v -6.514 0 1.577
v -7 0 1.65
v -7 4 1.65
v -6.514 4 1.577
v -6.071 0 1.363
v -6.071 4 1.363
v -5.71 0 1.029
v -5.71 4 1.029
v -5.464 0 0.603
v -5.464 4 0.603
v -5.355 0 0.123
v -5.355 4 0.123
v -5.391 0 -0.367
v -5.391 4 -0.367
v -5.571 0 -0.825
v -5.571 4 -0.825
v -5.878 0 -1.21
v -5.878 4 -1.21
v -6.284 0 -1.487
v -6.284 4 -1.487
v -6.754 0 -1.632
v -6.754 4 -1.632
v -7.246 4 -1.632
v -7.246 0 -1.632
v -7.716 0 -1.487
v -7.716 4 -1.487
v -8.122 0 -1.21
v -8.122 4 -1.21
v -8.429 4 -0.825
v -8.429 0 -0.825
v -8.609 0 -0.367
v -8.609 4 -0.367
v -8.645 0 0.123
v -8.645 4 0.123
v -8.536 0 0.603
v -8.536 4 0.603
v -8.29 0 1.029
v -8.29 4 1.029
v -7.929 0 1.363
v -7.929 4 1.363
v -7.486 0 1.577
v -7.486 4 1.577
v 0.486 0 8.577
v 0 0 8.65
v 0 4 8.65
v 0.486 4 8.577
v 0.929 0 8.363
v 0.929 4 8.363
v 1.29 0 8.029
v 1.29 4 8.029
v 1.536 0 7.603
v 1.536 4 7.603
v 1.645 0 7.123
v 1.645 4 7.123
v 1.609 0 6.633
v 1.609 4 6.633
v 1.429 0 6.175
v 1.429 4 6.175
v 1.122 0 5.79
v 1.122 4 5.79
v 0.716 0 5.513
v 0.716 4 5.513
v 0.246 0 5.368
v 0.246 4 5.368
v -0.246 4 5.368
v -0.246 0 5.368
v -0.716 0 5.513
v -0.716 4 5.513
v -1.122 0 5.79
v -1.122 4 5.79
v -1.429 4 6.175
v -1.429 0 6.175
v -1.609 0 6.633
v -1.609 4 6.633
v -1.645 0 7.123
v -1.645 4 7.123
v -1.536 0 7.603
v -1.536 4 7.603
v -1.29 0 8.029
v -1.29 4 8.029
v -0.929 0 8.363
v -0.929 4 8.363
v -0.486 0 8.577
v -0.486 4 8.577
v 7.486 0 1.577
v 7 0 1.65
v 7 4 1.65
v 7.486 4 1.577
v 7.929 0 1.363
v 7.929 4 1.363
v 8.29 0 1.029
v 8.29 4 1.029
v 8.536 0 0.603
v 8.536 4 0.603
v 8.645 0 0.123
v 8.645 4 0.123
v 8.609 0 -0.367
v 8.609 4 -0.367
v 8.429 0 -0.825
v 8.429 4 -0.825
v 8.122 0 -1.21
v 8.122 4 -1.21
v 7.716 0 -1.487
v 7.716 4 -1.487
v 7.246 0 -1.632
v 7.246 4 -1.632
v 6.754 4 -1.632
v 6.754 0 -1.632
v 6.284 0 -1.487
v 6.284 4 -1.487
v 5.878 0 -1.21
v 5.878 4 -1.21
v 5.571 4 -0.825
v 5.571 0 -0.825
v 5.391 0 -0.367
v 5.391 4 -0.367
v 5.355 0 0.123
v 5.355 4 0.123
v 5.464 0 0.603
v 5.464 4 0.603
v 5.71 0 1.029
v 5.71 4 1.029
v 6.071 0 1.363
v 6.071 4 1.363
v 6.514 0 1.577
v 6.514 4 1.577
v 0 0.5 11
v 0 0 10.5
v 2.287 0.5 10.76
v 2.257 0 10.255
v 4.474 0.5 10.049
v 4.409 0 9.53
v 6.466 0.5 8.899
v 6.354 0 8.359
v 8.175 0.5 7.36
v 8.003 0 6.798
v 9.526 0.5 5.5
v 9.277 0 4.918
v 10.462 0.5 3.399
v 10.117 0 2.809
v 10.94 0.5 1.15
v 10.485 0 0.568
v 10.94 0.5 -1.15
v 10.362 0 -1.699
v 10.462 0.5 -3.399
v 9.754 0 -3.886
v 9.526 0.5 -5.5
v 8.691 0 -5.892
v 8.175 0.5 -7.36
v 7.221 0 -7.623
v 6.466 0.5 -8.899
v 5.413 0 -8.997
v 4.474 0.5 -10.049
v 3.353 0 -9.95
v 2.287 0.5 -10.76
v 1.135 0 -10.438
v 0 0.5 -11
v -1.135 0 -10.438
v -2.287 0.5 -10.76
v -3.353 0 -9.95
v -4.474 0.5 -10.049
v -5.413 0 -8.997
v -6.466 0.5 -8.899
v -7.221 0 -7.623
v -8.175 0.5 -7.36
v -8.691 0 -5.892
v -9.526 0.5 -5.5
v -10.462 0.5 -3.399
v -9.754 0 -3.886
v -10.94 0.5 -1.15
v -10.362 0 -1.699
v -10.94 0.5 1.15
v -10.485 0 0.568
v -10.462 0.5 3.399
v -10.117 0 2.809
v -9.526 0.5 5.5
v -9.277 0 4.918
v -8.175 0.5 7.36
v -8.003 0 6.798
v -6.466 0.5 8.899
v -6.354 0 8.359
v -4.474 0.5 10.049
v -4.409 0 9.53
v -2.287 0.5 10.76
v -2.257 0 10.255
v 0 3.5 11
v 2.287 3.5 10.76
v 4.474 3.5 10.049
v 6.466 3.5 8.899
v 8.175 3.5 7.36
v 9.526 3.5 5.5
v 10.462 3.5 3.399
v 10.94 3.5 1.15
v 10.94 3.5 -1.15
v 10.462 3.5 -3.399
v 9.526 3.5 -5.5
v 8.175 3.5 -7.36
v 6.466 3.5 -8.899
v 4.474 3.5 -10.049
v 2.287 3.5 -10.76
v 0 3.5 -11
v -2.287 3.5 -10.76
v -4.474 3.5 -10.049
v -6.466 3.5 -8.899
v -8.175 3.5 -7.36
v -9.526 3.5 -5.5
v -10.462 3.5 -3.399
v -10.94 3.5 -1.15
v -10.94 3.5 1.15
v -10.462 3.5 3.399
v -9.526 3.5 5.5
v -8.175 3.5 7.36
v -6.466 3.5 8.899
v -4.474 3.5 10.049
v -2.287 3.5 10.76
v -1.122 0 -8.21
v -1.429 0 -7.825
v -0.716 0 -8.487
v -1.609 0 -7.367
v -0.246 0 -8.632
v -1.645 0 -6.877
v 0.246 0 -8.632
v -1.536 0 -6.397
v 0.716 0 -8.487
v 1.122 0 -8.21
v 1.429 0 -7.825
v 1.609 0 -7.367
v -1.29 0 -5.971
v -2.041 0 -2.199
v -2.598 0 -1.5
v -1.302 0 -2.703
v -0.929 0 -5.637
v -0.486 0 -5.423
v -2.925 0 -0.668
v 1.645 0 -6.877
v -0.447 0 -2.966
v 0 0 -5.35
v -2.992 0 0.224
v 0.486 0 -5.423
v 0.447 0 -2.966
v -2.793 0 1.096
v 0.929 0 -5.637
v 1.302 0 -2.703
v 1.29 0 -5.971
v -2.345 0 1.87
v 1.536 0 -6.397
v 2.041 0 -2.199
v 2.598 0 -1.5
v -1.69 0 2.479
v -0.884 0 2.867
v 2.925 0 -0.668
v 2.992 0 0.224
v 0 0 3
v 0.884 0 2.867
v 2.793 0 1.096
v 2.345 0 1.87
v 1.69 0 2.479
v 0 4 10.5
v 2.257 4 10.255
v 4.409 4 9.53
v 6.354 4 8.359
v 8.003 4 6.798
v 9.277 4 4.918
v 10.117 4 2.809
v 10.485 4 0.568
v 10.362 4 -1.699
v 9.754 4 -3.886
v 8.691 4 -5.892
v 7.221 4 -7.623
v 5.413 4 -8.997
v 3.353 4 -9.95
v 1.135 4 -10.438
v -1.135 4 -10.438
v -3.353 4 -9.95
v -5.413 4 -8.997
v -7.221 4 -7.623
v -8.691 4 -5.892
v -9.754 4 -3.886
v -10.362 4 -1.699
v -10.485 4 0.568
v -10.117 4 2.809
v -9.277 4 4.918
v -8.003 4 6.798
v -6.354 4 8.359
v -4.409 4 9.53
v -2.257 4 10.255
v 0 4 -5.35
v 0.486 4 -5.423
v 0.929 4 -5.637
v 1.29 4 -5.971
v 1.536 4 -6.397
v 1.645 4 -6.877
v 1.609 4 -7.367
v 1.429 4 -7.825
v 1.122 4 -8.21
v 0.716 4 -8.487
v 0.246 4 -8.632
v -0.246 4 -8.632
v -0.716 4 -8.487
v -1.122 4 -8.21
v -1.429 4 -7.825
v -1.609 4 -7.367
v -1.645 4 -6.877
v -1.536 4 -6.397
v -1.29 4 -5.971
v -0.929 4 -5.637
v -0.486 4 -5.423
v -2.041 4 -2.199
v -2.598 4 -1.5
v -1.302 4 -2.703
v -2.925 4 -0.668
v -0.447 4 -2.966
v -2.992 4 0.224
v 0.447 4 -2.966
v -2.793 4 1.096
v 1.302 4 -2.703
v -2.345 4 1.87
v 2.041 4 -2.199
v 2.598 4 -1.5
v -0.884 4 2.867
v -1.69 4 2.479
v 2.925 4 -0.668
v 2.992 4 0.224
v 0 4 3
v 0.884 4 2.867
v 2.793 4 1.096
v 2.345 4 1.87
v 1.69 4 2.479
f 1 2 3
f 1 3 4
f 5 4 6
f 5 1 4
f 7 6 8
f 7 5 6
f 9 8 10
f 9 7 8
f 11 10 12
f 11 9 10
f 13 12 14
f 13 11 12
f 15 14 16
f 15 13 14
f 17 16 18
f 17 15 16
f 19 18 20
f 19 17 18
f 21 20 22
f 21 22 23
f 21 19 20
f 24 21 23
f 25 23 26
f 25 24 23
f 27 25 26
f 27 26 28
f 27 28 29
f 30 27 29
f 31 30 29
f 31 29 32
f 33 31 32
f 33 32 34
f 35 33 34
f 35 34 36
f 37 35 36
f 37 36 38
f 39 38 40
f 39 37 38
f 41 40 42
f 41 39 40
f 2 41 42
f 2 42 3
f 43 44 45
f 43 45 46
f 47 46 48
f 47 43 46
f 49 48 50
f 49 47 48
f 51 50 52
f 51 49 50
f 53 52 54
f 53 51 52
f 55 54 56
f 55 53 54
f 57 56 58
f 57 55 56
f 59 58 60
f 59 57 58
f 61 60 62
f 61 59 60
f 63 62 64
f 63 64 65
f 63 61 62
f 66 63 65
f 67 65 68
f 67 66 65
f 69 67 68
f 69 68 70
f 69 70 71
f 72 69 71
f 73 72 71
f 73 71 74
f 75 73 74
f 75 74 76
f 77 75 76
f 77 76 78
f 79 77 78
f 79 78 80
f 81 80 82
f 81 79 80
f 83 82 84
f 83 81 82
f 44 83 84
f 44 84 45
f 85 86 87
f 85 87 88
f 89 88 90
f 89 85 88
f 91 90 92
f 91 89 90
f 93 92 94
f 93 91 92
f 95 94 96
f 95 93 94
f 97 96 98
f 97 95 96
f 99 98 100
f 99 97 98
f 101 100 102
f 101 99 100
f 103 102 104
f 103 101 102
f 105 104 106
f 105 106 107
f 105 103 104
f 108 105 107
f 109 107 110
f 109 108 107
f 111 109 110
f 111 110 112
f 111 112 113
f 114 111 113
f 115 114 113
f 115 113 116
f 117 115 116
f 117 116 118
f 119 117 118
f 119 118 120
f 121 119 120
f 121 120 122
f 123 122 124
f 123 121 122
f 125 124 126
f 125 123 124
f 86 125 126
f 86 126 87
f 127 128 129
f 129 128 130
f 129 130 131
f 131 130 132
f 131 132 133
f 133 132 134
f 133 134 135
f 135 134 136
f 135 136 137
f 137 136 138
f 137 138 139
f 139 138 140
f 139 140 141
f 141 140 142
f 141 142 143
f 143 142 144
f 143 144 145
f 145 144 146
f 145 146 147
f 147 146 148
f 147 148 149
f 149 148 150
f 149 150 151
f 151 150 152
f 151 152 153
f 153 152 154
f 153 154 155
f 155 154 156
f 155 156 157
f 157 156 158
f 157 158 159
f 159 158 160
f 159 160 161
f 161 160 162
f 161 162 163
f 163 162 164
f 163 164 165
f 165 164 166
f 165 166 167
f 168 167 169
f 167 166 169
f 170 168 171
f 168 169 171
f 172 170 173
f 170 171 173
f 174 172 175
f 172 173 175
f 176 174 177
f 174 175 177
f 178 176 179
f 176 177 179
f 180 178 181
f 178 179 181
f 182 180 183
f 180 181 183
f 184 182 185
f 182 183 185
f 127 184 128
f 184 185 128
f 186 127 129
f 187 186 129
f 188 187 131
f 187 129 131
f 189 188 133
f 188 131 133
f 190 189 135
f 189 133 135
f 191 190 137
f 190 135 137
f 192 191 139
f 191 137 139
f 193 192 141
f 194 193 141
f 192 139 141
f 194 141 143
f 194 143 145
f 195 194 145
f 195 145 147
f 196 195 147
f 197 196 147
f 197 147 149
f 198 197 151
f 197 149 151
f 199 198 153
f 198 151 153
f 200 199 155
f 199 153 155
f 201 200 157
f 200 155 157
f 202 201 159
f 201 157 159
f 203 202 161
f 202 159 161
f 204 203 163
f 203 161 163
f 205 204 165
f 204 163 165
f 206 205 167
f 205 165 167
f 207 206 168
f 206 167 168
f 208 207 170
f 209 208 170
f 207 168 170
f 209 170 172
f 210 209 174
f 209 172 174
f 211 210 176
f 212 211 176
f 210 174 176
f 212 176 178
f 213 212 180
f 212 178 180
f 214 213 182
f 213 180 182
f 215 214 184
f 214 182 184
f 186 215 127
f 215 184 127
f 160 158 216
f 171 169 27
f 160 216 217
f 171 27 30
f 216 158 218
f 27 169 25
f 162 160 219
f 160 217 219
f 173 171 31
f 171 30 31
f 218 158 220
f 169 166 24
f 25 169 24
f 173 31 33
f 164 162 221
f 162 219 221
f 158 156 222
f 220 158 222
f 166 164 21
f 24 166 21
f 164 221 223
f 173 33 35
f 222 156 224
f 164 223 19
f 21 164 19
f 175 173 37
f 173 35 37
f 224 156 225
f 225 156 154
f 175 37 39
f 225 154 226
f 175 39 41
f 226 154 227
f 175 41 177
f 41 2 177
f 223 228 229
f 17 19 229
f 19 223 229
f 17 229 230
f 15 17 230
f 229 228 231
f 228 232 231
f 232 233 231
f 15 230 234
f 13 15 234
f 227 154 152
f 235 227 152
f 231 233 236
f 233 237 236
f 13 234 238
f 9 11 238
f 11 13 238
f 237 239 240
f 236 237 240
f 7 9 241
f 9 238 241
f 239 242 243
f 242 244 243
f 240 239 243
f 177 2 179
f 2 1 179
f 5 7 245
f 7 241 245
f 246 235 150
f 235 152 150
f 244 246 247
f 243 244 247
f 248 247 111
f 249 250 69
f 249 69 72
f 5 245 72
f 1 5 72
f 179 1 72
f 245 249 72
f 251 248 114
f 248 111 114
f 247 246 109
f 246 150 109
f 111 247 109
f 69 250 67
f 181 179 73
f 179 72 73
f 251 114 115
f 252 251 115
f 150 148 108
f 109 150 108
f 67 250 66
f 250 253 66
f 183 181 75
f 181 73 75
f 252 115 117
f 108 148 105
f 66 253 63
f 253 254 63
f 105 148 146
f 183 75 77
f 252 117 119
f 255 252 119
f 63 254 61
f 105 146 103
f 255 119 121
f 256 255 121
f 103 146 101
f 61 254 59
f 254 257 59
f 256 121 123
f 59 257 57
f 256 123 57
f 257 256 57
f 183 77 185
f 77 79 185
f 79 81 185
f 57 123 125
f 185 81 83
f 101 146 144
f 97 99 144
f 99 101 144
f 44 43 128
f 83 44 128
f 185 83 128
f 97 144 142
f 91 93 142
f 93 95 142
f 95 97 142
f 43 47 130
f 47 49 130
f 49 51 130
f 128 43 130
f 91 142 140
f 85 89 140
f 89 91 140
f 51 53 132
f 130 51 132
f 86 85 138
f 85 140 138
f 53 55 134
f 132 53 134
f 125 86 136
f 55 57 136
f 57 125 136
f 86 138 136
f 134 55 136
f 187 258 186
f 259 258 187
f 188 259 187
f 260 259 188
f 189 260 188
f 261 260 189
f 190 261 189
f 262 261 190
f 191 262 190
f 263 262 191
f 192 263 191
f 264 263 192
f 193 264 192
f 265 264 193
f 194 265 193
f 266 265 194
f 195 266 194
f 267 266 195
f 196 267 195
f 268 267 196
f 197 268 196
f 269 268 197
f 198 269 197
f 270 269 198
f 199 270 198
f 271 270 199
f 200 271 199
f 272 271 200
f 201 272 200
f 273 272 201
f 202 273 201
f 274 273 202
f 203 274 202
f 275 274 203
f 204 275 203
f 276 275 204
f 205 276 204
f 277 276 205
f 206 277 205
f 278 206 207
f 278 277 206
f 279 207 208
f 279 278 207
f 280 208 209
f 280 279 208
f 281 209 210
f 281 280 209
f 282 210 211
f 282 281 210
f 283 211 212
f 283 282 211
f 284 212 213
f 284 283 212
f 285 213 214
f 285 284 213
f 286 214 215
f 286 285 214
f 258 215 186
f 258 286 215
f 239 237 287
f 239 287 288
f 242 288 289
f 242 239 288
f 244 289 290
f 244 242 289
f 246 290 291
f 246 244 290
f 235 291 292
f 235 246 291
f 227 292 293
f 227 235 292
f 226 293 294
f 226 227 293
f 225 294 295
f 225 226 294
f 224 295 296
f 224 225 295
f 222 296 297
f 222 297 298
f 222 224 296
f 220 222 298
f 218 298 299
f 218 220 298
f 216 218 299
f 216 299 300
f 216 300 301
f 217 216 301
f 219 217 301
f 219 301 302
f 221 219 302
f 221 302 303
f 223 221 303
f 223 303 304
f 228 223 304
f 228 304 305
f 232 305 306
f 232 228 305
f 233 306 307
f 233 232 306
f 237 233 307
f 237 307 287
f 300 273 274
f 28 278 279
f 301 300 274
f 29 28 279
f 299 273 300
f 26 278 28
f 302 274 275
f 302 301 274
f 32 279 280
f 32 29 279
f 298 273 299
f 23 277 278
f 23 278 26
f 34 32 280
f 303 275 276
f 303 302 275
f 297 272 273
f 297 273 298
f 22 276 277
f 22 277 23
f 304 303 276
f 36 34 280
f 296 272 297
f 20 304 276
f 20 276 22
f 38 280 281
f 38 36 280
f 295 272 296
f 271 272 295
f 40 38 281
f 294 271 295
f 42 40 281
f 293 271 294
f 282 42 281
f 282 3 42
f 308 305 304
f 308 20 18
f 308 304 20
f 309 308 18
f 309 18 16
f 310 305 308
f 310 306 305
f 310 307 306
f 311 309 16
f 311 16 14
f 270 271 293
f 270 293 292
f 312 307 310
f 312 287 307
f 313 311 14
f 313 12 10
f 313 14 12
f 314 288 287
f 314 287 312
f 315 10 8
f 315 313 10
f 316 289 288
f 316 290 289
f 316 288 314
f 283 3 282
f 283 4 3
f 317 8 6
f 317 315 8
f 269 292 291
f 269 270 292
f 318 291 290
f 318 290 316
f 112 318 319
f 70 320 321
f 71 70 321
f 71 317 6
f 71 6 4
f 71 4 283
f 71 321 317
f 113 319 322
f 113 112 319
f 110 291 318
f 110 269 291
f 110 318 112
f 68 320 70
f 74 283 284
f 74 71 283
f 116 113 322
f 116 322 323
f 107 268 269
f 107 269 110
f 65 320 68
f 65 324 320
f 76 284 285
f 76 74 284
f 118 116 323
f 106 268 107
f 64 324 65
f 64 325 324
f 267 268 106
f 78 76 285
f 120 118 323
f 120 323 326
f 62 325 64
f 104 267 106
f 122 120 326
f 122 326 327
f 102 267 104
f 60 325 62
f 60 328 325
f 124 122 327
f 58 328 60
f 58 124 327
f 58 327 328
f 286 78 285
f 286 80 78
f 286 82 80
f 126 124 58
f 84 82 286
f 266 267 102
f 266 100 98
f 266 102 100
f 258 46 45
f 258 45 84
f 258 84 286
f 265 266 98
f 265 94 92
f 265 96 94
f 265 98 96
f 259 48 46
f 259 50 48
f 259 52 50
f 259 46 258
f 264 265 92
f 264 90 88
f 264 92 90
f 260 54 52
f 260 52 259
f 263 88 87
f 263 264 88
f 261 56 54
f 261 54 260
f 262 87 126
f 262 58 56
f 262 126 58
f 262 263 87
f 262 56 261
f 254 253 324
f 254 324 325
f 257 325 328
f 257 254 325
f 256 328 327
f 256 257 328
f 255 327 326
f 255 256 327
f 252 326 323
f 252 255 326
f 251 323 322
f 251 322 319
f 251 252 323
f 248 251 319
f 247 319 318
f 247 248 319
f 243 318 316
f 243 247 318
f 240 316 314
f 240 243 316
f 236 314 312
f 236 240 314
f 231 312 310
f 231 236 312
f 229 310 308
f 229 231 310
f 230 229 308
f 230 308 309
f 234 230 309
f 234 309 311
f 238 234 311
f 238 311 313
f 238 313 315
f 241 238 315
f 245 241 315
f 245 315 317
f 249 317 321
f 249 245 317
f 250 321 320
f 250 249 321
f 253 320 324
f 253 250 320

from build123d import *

# Parameters (mm, degrees)
ESQUISSE1_R        = 11
ESQUISSE1_R_2      = 1.65
ESQUISSE1_R_3      = 3
BOSS_EXTRU_1_DEPTH = 4
CHANFREIN1_SIZE    = 0.5


with BuildPart() as part:
    # Esquisse1 → Boss.-Extru.1 (new body)
    with BuildSketch(Plane(origin=(0, 0, 0), x_dir=(1, 0, 0), z_dir=(0, 1, 0))):
        with Locations(Location((0, 0, 0), (0, 0, 270))):
            Circle(ESQUISSE1_R)
        with Locations(Location((0, 7, 0), (0, 0, 270))):
            Circle(ESQUISSE1_R_2, mode=Mode.SUBTRACT)
        with Locations(Location((7, 0, 0), (0, 0, 270))):
            Circle(ESQUISSE1_R_2, mode=Mode.SUBTRACT)
        with Locations(Location((0, -7, 0), (0, 0, 270))):
            Circle(ESQUISSE1_R_2, mode=Mode.SUBTRACT)
        with Locations(Location((-7, 0, 0), (0, 0, 270))):
            Circle(ESQUISSE1_R_2, mode=Mode.SUBTRACT)
        with Locations(Location((0, 0, 0), (0, 0, 270))):
            Circle(ESQUISSE1_R_3, mode=Mode.SUBTRACT)
    extrude(amount=BOSS_EXTRU_1_DEPTH)

    # Chanfrein1
    chanfrein1_edges = [part.edges().sort_by_distance(p)[0] for p in [
        (0, 0, -11),
        (0, 4, -11),
    ]]
    chamfer(chanfrein1_edges, length=CHANFREIN1_SIZE)


solid = part.part
